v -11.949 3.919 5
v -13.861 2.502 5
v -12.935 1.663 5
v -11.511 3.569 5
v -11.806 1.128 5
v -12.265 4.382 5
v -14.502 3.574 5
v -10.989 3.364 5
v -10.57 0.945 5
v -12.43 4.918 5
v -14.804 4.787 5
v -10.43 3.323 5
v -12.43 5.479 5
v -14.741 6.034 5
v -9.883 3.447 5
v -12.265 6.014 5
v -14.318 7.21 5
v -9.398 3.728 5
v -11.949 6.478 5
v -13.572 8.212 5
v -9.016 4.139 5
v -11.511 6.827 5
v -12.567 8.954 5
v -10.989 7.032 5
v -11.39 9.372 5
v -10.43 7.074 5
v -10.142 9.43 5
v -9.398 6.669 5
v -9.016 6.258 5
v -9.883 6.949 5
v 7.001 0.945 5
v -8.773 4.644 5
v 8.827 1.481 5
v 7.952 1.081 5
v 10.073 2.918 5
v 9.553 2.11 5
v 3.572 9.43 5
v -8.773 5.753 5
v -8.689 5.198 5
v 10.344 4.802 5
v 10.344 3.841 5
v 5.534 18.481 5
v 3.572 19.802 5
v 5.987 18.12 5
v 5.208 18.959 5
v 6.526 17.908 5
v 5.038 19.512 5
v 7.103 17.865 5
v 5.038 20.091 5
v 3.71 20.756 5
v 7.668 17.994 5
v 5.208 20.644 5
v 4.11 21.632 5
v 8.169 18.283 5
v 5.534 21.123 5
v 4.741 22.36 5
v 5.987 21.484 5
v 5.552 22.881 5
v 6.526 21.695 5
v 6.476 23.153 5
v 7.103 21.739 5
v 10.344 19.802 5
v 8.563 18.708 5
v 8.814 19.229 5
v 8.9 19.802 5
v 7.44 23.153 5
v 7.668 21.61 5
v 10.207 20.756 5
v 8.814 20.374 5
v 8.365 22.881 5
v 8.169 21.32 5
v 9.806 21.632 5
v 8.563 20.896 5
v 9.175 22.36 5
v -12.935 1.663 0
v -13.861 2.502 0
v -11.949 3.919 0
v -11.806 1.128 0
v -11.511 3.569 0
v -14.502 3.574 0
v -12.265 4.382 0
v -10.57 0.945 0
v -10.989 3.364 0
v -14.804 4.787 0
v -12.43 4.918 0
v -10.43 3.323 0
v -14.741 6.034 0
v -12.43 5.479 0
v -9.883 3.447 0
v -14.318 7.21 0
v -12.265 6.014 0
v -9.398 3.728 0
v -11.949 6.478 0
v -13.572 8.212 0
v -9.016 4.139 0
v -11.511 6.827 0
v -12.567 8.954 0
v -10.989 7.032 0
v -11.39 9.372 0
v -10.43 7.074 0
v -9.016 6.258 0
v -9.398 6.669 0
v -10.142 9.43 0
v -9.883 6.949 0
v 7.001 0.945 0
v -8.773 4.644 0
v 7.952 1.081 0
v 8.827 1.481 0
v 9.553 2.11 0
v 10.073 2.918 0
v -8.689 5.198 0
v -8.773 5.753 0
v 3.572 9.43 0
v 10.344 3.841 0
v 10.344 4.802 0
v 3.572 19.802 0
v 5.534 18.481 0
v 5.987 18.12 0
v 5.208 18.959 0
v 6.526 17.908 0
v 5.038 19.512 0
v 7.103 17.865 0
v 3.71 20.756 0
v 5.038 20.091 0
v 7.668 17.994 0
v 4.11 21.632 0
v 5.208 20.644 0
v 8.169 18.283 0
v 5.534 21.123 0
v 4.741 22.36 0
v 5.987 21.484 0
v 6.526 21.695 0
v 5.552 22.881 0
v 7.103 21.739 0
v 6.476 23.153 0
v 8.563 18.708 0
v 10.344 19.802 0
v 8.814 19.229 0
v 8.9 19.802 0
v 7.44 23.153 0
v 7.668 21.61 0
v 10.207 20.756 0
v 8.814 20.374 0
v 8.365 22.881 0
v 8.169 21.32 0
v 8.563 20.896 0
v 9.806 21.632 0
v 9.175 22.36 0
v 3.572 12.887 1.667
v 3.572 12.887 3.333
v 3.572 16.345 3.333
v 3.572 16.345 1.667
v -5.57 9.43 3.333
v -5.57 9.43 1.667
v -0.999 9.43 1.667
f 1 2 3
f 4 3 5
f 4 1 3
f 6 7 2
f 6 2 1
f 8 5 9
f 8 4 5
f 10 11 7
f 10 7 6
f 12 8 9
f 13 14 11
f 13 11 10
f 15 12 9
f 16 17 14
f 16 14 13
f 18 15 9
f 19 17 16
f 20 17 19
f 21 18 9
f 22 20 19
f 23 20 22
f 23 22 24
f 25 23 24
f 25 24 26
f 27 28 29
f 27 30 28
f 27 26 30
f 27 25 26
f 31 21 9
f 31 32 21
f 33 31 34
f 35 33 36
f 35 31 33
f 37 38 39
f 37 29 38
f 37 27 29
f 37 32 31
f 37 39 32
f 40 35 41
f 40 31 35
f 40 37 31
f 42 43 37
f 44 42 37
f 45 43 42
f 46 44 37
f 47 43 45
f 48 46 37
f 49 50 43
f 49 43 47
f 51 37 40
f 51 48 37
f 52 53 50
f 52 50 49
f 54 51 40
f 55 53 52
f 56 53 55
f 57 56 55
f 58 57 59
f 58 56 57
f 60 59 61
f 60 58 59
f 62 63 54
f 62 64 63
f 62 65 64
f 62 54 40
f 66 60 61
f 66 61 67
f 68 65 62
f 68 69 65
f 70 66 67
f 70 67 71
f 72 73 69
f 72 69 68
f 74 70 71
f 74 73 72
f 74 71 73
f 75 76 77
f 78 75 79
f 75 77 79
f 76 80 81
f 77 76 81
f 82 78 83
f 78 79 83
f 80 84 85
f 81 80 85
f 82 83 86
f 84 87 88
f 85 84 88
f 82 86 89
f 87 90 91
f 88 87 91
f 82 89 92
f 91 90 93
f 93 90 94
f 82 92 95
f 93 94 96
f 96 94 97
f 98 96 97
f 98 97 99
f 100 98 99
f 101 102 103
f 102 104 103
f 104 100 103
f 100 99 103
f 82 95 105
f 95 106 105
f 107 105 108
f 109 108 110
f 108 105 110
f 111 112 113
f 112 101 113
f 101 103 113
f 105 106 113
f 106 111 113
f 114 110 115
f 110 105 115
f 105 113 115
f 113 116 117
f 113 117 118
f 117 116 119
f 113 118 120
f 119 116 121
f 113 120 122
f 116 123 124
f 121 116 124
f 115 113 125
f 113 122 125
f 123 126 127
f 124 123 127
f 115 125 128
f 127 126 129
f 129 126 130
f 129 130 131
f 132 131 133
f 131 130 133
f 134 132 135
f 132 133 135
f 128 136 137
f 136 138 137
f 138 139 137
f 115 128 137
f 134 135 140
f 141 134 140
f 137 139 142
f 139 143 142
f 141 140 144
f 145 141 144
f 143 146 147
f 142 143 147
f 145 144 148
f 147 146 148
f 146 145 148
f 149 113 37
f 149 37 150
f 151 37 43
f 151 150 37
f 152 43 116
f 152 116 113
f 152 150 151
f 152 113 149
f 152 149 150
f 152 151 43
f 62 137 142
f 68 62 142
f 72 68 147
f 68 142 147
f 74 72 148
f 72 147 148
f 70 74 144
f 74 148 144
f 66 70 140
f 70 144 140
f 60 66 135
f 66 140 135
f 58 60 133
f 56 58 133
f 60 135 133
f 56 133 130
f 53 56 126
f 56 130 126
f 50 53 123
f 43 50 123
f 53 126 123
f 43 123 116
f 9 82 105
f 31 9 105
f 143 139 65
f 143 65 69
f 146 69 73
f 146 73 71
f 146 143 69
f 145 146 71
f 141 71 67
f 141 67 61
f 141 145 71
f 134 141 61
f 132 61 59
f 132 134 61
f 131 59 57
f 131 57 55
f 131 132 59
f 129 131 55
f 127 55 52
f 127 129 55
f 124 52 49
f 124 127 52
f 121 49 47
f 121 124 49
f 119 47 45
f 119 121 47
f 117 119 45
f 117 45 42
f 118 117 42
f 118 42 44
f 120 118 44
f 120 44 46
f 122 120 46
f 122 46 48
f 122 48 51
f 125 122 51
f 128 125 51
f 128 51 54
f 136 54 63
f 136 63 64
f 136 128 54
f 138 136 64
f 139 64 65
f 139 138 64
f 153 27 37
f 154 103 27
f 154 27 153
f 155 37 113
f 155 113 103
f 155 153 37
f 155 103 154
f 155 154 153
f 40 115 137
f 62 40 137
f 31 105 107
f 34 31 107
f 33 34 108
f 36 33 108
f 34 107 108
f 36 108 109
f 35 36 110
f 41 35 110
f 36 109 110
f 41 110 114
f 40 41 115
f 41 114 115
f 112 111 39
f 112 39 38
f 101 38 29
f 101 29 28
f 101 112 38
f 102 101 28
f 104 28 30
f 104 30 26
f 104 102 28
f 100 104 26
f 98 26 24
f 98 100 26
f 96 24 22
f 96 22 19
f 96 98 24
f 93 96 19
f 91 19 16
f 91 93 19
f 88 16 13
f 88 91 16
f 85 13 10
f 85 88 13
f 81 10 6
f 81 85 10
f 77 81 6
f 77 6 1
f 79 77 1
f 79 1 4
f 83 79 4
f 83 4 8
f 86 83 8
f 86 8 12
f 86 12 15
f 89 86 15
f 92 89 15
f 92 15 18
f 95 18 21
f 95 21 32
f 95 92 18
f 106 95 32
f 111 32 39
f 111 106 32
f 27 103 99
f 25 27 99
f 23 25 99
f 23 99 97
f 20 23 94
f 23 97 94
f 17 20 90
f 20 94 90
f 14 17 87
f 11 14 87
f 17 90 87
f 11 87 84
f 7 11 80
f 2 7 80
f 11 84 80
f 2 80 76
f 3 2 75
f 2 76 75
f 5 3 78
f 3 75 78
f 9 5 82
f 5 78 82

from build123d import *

# Parameters (mm, degrees)
F0_R     = 1.881022
F0_R_2   = 1.942209
F1_DEPTH = 5


with BuildPart() as f1:
    # F0 (on Top) → F1 (new body)
    with BuildSketch(Plane.XY):
        with BuildLine():
            ThreePointArc((-10.141898, 9.43031), (-14.818735, 5.412834), (-10.570469, 0.944595))
            Line((-10.570469, 0.944595), (7.000959, 0.944595))
            ThreePointArc((7.000959, 0.944595), (9.553028, 2.109944), (10.343815, 4.801738))
            Line((10.343815, 4.801738), (10.343815, 19.801738))
            ThreePointArc((10.343815, 19.801738), (6.958101, 23.187452), (3.572387, 19.801738))
            add(Edge.make_bspline(
                [(3.572387, 9.43031), (3.572387, 12.887452), (3.572387, 16.344595), (3.572387, 19.801738)],
                knots=[0, 0, 0, 0, 10.371429, 10.371429, 10.371429, 10.371429], degree=3))
            add(Edge.make_bspline(
                [(-10.141898, 9.43031), (-5.570469, 9.43031), (-0.999041, 9.43031), (3.572387, 9.43031)],
                knots=[0, 0, 0, 0, 13.714285, 13.714285, 13.714285, 13.714285], degree=3))
        make_face()
        with Locations((-10.570469, 5.198275)):
            Circle(F0_R, mode=Mode.SUBTRACT)
        with Locations((6.958101, 19.801738)):
            Circle(F0_R_2, mode=Mode.SUBTRACT)
    extrude(amount=F1_DEPTH)


solid = f1.part
